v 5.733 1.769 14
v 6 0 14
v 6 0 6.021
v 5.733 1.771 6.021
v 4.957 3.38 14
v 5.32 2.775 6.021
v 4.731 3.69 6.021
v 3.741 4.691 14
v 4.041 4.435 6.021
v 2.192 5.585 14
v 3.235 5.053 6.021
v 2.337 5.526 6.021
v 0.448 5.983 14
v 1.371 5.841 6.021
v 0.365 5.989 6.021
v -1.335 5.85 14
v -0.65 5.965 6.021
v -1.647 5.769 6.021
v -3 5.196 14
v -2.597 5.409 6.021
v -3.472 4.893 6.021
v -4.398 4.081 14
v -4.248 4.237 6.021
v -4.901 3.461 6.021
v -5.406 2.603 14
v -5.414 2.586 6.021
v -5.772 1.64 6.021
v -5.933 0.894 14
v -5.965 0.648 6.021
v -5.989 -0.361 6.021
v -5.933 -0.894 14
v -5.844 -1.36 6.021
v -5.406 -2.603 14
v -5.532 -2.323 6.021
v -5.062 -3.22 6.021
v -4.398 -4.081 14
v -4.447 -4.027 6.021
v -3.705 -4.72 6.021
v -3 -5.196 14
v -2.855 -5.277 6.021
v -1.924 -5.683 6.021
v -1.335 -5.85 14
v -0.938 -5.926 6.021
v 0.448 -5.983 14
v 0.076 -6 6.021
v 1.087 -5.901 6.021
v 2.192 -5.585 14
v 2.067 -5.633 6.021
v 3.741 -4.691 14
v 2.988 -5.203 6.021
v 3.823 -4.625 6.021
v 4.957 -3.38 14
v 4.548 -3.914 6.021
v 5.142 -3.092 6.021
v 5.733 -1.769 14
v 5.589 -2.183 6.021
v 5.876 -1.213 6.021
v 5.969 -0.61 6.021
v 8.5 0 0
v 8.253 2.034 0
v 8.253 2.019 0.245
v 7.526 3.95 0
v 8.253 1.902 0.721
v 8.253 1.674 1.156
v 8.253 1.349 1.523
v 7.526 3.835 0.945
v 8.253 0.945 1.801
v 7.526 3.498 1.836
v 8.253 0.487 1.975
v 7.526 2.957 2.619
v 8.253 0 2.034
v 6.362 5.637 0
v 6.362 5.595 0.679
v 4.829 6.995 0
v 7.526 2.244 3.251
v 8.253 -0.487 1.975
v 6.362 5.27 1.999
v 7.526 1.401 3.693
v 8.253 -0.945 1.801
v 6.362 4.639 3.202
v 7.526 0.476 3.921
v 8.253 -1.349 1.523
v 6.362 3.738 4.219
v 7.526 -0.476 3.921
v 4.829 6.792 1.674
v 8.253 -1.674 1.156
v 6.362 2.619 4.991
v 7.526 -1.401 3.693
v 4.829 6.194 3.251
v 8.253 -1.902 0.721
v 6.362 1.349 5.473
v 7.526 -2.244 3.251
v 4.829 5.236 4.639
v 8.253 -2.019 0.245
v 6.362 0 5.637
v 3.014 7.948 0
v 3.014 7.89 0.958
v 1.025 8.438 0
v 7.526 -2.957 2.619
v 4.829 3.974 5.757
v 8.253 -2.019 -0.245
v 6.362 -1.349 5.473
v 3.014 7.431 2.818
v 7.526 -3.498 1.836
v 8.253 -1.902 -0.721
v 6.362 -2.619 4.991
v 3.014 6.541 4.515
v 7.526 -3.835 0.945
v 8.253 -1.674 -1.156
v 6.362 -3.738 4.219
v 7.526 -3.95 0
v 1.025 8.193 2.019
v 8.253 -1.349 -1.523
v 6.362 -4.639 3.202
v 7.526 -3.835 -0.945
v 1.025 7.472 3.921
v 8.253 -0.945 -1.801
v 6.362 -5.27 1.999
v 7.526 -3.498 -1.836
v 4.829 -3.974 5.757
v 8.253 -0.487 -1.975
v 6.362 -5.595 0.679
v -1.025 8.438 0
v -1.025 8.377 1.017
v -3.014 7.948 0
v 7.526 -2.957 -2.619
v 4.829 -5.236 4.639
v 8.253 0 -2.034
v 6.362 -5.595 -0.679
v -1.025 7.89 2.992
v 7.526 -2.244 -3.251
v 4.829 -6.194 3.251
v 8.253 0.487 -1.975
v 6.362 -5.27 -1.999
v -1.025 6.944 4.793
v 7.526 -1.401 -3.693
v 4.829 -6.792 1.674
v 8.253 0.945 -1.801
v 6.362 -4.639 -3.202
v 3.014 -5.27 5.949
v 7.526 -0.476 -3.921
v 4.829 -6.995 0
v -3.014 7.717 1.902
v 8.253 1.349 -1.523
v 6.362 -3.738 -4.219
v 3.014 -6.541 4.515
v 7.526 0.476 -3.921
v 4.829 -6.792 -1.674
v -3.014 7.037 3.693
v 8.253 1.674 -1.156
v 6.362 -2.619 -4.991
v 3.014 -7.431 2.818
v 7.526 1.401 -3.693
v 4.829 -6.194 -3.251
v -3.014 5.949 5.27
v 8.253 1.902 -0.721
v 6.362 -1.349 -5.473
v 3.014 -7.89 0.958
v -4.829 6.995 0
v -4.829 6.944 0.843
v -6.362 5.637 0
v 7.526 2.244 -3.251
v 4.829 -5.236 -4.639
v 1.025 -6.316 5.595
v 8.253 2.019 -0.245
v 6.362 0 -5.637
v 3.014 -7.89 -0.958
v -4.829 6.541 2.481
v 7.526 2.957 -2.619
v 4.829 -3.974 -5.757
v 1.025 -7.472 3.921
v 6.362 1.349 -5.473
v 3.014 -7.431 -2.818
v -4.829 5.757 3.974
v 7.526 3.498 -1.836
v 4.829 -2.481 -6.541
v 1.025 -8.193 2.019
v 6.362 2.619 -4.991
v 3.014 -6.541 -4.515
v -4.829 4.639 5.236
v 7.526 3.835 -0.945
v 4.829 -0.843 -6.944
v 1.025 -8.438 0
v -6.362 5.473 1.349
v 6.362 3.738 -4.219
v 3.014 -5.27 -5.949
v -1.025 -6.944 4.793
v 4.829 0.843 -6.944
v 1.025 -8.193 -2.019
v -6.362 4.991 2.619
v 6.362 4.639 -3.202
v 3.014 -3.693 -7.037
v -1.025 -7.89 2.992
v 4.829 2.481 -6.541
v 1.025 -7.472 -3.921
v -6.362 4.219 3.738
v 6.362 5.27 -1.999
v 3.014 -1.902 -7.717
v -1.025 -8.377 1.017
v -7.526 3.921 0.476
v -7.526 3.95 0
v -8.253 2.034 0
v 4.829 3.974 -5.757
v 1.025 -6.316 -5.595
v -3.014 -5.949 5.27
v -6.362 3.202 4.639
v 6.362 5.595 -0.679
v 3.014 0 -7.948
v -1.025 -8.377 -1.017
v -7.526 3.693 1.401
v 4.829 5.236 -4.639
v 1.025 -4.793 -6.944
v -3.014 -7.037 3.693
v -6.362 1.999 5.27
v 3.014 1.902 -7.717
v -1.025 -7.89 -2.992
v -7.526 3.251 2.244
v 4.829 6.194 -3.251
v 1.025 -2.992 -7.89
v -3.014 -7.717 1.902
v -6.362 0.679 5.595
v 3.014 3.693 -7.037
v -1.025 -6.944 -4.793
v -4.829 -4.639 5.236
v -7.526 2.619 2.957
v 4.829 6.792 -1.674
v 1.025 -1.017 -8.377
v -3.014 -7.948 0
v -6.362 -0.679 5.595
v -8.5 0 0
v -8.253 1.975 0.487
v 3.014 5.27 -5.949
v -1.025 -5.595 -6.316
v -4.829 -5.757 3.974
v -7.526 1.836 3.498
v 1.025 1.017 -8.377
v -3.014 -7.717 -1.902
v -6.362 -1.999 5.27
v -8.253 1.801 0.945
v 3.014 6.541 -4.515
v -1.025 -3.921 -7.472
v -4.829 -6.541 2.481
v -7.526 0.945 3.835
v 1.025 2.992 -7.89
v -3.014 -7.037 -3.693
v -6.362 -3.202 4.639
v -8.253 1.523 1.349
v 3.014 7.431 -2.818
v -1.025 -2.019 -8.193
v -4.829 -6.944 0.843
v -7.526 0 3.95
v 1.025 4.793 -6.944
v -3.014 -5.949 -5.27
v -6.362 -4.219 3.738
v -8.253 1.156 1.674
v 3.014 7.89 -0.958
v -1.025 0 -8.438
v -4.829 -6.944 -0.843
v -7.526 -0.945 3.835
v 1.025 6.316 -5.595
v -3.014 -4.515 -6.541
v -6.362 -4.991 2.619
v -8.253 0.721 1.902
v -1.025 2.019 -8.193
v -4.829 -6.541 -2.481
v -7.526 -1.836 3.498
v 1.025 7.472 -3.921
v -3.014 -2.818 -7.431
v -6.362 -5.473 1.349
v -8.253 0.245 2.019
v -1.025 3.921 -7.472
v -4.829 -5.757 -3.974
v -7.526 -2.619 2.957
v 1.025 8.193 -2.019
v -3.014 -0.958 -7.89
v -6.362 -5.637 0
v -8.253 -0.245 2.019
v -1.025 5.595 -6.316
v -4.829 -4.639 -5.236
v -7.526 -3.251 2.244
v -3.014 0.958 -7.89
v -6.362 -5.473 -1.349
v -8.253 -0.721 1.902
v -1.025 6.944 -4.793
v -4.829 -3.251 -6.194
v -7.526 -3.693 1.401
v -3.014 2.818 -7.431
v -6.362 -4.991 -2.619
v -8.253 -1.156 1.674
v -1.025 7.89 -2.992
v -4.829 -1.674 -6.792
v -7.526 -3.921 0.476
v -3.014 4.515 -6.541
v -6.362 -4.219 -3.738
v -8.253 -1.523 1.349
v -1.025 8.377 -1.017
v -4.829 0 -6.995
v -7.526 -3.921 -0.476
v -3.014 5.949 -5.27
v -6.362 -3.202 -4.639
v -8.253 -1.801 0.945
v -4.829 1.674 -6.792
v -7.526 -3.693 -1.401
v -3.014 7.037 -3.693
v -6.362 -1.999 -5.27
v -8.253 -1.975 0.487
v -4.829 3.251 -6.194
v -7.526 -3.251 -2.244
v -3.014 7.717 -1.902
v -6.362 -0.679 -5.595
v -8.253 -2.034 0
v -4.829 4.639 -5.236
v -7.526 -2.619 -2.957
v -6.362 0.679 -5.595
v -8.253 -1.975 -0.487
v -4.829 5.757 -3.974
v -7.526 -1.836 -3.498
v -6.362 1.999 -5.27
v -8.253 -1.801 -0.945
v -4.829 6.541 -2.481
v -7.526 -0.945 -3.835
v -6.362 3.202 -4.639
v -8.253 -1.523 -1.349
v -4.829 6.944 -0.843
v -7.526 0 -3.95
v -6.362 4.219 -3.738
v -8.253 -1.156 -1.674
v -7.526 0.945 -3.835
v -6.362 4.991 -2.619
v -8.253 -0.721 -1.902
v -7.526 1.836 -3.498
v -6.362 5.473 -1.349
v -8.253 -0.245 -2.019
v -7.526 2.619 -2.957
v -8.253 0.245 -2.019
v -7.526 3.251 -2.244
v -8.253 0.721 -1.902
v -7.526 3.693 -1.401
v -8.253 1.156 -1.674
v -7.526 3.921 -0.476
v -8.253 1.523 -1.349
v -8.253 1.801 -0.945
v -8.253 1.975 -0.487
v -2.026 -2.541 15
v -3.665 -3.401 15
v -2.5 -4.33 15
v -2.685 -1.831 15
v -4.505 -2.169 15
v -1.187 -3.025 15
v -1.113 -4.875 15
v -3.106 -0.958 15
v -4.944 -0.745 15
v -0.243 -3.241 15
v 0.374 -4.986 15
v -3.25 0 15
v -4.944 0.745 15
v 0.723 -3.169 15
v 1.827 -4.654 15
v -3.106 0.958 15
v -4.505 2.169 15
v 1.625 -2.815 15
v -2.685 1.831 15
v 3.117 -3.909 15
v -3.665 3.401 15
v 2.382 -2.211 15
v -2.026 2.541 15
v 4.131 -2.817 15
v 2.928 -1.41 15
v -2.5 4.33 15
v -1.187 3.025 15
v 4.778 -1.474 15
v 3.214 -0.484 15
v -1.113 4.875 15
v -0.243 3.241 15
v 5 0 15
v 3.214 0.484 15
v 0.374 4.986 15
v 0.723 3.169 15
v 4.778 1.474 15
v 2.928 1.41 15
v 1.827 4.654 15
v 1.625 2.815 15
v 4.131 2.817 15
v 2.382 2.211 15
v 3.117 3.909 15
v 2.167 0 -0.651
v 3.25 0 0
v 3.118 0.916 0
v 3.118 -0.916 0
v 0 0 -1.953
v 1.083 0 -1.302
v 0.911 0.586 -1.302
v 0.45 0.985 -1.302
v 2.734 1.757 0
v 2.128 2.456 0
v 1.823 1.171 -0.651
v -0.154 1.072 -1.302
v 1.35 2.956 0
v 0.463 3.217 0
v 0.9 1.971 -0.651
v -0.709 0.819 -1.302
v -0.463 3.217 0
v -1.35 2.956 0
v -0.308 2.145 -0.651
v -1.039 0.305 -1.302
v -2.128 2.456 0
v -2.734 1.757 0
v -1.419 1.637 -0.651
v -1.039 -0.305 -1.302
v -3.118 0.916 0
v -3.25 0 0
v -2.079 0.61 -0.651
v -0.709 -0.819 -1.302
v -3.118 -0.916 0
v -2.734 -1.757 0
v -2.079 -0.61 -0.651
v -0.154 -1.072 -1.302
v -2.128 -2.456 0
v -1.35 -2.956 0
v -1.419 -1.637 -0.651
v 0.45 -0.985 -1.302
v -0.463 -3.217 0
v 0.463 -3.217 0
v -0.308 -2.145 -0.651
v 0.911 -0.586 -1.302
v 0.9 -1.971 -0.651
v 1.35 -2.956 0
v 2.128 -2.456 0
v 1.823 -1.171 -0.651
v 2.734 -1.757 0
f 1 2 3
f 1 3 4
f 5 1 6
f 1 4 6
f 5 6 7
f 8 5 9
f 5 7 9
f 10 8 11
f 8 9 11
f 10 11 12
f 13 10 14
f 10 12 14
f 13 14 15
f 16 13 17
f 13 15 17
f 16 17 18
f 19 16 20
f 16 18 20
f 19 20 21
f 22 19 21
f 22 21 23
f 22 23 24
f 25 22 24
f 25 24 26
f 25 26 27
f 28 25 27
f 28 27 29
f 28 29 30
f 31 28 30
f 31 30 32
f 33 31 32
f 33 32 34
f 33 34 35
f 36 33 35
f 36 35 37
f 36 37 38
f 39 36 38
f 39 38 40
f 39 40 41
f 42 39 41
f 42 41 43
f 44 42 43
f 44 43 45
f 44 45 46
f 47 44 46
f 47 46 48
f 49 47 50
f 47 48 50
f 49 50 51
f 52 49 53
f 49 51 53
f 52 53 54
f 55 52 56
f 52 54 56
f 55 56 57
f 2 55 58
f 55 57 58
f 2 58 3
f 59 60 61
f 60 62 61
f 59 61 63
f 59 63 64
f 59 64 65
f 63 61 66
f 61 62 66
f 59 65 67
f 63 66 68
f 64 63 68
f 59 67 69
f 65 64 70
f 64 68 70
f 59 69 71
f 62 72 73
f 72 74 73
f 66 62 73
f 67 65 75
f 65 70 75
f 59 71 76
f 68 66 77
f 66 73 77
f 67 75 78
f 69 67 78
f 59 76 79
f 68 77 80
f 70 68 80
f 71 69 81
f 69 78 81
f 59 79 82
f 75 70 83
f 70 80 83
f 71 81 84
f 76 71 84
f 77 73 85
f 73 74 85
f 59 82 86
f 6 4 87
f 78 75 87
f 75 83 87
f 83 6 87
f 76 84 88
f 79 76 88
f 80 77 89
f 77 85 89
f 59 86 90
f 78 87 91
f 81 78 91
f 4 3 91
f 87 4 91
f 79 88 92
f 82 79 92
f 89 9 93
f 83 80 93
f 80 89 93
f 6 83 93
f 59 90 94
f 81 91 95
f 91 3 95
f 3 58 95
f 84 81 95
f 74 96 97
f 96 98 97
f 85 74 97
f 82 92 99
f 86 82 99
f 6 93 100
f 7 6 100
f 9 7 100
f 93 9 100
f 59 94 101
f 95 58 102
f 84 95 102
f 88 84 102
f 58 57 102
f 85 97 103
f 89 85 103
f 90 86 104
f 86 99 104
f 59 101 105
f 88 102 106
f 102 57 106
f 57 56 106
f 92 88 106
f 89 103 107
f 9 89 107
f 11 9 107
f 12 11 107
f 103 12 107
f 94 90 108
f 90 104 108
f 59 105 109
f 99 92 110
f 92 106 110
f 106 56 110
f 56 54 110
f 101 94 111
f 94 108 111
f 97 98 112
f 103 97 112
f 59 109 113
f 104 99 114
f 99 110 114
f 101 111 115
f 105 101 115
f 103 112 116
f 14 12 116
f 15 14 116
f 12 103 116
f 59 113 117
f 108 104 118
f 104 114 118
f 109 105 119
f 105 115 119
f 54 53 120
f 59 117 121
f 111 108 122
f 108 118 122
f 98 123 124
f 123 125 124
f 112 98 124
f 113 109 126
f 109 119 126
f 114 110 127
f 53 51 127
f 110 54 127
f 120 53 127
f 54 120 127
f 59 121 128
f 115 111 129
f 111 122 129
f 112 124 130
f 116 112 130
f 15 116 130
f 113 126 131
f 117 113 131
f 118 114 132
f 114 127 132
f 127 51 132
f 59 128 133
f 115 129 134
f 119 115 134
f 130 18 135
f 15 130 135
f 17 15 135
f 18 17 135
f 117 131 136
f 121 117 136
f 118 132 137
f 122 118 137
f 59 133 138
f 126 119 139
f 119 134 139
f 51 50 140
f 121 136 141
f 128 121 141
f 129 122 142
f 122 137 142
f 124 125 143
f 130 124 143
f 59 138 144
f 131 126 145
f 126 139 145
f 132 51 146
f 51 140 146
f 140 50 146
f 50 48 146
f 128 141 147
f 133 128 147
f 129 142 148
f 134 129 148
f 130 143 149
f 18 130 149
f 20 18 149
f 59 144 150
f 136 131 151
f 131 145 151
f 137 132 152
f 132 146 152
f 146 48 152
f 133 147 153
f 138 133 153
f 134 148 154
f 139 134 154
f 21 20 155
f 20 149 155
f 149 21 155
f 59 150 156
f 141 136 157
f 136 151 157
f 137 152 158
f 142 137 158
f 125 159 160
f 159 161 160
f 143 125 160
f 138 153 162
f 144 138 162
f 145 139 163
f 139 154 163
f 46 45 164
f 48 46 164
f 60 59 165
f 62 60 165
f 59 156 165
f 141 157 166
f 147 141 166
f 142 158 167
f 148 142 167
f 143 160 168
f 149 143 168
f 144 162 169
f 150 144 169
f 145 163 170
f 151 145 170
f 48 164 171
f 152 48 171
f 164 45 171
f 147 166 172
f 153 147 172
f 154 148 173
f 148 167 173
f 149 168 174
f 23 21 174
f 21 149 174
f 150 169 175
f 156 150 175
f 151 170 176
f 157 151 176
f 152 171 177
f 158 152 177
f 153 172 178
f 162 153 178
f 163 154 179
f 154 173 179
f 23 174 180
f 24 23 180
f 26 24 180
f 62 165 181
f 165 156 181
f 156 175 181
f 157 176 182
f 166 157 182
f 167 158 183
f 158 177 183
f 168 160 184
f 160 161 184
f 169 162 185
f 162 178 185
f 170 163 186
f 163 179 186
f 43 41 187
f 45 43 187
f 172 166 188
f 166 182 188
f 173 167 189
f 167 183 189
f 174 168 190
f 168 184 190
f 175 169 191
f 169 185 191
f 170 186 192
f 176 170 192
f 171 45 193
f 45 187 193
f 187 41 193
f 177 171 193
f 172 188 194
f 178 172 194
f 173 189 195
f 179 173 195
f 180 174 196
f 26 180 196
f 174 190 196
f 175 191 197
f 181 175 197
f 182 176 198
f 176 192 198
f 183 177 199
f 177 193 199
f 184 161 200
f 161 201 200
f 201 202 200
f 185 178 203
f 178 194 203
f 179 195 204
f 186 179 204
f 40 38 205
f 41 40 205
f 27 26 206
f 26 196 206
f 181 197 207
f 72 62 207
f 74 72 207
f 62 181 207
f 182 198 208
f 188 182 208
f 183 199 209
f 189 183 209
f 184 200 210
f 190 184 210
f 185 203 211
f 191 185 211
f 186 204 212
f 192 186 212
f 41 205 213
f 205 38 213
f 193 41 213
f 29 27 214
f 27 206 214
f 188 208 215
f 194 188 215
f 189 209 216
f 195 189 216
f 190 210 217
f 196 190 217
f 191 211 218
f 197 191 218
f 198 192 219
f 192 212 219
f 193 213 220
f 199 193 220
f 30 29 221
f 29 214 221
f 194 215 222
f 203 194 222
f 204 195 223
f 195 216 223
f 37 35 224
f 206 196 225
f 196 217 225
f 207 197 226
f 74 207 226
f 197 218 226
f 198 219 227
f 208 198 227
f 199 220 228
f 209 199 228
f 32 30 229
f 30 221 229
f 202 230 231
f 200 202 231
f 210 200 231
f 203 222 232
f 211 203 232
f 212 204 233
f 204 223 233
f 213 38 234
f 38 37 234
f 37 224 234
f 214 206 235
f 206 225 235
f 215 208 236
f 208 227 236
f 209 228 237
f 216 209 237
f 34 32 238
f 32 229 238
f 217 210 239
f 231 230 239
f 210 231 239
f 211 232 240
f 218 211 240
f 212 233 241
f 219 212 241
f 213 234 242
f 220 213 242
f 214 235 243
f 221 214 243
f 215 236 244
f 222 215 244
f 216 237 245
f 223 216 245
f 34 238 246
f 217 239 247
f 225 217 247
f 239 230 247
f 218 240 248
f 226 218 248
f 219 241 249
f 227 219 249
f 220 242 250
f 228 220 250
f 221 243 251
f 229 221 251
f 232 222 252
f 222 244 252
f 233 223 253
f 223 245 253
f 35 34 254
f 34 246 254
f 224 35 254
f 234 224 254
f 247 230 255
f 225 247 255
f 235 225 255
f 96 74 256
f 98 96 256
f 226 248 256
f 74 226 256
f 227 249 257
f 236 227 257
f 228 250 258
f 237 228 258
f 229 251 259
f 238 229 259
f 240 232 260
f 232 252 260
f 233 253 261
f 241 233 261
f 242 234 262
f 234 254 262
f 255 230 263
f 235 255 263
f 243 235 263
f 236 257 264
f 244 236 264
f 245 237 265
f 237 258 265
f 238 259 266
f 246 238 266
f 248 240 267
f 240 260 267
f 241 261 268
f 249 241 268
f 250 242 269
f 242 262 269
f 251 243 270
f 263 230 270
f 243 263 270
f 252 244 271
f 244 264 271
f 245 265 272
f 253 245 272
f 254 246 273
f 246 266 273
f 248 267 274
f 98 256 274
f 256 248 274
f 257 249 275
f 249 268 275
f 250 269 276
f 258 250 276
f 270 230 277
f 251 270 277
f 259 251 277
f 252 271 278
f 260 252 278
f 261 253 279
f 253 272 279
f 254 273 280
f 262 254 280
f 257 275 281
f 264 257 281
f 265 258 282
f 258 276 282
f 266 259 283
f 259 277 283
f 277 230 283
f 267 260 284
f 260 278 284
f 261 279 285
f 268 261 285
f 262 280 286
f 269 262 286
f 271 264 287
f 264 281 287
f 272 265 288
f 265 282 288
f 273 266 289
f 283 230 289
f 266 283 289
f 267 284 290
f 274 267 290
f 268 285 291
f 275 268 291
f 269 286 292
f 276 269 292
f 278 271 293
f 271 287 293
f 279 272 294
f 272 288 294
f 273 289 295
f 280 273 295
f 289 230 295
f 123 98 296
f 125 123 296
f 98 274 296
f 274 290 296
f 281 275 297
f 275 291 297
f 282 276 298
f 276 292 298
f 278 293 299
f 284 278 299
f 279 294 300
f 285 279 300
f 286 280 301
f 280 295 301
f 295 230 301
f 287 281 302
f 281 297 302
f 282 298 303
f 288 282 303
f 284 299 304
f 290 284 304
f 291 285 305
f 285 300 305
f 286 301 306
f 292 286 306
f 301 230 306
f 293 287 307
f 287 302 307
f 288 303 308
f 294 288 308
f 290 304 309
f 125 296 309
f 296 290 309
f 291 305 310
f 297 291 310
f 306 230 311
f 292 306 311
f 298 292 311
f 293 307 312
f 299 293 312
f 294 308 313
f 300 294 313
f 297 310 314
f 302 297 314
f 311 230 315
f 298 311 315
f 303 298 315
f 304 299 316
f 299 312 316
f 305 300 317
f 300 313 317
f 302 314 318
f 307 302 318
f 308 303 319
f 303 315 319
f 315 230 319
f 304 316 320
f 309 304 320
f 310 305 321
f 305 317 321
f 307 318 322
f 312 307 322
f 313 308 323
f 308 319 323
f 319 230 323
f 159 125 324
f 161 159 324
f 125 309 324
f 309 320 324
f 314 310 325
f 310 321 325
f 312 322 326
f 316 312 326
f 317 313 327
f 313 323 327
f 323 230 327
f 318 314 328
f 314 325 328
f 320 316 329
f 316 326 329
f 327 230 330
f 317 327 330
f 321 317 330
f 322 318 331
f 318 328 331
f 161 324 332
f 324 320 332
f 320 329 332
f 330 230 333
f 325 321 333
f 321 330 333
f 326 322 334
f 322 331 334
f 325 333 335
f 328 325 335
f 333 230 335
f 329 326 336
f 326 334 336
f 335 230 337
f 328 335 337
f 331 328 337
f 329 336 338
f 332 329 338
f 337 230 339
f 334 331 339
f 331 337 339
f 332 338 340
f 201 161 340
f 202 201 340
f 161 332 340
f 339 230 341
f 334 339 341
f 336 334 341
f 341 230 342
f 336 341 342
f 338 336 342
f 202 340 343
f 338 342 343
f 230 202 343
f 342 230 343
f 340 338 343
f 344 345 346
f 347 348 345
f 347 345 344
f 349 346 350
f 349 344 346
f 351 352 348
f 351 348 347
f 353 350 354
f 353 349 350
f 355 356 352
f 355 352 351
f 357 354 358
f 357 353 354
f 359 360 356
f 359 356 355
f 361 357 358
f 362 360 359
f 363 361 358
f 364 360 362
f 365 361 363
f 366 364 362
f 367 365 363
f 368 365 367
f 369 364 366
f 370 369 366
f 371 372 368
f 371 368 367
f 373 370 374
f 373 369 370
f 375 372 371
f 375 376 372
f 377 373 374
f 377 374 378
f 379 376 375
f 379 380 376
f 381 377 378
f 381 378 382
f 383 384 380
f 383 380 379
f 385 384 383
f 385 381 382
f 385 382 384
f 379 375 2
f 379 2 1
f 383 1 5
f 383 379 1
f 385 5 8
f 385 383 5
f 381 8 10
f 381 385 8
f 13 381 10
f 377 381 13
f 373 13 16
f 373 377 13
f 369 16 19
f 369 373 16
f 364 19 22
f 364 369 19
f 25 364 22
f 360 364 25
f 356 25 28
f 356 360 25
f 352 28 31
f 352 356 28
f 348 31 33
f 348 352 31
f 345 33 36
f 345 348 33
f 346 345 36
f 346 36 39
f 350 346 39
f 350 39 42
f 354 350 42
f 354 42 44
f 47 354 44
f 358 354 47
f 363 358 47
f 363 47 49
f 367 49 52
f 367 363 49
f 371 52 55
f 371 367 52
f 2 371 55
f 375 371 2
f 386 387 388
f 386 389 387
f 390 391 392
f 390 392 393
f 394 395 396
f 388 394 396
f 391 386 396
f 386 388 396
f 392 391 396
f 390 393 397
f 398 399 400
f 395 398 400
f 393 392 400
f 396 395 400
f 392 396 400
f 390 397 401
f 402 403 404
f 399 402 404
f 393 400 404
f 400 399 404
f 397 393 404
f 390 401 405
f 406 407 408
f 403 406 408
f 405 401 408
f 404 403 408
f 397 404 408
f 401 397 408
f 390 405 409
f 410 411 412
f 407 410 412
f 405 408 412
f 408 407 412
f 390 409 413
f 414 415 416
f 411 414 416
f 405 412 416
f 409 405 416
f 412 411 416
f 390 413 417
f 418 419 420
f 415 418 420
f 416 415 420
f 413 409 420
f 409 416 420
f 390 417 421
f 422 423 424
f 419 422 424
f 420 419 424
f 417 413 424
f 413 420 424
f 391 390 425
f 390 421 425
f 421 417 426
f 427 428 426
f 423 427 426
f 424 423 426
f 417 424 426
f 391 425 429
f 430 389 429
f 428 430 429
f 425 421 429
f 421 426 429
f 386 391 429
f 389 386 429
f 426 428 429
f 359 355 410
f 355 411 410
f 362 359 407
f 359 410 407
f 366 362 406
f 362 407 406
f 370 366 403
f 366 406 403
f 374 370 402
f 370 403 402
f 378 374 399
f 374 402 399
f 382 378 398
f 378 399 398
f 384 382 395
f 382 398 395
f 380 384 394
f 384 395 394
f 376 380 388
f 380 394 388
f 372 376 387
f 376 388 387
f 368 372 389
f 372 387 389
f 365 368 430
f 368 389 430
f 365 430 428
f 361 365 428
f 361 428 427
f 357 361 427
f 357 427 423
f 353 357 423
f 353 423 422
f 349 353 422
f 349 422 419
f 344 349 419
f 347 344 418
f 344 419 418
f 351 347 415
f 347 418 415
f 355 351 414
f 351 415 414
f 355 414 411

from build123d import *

# Parameters (mm, degrees)
F0_R     = 6
F1_DEPTH = 15
F5_D     = 6.5
F5_DEPTH = 15
F5_TIP   = 1.9527970118
F6_SIZE  = 1


with BuildPart() as f1:
    # F0 (on Top) → F1 (new body)
    with BuildSketch(Plane.XY):
        Circle(F0_R)
    extrude(amount=F1_DEPTH)

    # F2 (on Top) → F3 (revolve)
    with BuildSketch(Plane.XY):
        with BuildLine():
            Line((-8.5, 0), (8.5, 0))
            ThreePointArc((8.5, 0), (0, 8.5), (-8.5, 0))
        make_face()
    revolve(axis=Axis((0, 0, 0), (1, 0, 0)))

    # F5
    with Locations(Plane.XY.offset(15)):
        with Locations((0, 0)):
            Hole(F5_D / 2, depth=F5_DEPTH)
            with Locations((0, 0, -(F5_DEPTH + F5_TIP / 2))):  # 118° drill point
                Cone(0, F5_D / 2, F5_TIP, mode=Mode.SUBTRACT)

    # F6
    f6_edges = [f1.edges().sort_by_distance(p)[0] for p in [
        (-6, 0, 15),
    ]]
    chamfer(f6_edges, length=F6_SIZE)


solid = f1.part
